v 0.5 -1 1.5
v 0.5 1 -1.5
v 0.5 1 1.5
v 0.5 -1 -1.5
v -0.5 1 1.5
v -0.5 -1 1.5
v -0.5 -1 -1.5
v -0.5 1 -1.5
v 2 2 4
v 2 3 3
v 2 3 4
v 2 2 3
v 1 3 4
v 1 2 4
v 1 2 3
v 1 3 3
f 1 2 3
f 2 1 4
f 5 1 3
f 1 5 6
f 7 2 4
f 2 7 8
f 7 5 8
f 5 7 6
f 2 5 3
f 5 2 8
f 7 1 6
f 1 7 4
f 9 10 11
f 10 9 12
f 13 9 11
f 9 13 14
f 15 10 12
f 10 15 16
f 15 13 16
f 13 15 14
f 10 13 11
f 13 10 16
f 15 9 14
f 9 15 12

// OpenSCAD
m = [[1,0,0],
     [0,1,0],

     [0,0,1]];
flat = [[1,0,0],[0,1,0]];
pts = [0,1,2,3,4,5,6,7,8,9,10,11,12,13,14,15,16,17,18,19,20,21,22,23,24,25,26,27,28,29,30,31,32,33,34,35,36,37,38,39,40,
   41,42];
cube(
  [1,2,3], center=true);
translate([
  1,2,3]) cube(1);
